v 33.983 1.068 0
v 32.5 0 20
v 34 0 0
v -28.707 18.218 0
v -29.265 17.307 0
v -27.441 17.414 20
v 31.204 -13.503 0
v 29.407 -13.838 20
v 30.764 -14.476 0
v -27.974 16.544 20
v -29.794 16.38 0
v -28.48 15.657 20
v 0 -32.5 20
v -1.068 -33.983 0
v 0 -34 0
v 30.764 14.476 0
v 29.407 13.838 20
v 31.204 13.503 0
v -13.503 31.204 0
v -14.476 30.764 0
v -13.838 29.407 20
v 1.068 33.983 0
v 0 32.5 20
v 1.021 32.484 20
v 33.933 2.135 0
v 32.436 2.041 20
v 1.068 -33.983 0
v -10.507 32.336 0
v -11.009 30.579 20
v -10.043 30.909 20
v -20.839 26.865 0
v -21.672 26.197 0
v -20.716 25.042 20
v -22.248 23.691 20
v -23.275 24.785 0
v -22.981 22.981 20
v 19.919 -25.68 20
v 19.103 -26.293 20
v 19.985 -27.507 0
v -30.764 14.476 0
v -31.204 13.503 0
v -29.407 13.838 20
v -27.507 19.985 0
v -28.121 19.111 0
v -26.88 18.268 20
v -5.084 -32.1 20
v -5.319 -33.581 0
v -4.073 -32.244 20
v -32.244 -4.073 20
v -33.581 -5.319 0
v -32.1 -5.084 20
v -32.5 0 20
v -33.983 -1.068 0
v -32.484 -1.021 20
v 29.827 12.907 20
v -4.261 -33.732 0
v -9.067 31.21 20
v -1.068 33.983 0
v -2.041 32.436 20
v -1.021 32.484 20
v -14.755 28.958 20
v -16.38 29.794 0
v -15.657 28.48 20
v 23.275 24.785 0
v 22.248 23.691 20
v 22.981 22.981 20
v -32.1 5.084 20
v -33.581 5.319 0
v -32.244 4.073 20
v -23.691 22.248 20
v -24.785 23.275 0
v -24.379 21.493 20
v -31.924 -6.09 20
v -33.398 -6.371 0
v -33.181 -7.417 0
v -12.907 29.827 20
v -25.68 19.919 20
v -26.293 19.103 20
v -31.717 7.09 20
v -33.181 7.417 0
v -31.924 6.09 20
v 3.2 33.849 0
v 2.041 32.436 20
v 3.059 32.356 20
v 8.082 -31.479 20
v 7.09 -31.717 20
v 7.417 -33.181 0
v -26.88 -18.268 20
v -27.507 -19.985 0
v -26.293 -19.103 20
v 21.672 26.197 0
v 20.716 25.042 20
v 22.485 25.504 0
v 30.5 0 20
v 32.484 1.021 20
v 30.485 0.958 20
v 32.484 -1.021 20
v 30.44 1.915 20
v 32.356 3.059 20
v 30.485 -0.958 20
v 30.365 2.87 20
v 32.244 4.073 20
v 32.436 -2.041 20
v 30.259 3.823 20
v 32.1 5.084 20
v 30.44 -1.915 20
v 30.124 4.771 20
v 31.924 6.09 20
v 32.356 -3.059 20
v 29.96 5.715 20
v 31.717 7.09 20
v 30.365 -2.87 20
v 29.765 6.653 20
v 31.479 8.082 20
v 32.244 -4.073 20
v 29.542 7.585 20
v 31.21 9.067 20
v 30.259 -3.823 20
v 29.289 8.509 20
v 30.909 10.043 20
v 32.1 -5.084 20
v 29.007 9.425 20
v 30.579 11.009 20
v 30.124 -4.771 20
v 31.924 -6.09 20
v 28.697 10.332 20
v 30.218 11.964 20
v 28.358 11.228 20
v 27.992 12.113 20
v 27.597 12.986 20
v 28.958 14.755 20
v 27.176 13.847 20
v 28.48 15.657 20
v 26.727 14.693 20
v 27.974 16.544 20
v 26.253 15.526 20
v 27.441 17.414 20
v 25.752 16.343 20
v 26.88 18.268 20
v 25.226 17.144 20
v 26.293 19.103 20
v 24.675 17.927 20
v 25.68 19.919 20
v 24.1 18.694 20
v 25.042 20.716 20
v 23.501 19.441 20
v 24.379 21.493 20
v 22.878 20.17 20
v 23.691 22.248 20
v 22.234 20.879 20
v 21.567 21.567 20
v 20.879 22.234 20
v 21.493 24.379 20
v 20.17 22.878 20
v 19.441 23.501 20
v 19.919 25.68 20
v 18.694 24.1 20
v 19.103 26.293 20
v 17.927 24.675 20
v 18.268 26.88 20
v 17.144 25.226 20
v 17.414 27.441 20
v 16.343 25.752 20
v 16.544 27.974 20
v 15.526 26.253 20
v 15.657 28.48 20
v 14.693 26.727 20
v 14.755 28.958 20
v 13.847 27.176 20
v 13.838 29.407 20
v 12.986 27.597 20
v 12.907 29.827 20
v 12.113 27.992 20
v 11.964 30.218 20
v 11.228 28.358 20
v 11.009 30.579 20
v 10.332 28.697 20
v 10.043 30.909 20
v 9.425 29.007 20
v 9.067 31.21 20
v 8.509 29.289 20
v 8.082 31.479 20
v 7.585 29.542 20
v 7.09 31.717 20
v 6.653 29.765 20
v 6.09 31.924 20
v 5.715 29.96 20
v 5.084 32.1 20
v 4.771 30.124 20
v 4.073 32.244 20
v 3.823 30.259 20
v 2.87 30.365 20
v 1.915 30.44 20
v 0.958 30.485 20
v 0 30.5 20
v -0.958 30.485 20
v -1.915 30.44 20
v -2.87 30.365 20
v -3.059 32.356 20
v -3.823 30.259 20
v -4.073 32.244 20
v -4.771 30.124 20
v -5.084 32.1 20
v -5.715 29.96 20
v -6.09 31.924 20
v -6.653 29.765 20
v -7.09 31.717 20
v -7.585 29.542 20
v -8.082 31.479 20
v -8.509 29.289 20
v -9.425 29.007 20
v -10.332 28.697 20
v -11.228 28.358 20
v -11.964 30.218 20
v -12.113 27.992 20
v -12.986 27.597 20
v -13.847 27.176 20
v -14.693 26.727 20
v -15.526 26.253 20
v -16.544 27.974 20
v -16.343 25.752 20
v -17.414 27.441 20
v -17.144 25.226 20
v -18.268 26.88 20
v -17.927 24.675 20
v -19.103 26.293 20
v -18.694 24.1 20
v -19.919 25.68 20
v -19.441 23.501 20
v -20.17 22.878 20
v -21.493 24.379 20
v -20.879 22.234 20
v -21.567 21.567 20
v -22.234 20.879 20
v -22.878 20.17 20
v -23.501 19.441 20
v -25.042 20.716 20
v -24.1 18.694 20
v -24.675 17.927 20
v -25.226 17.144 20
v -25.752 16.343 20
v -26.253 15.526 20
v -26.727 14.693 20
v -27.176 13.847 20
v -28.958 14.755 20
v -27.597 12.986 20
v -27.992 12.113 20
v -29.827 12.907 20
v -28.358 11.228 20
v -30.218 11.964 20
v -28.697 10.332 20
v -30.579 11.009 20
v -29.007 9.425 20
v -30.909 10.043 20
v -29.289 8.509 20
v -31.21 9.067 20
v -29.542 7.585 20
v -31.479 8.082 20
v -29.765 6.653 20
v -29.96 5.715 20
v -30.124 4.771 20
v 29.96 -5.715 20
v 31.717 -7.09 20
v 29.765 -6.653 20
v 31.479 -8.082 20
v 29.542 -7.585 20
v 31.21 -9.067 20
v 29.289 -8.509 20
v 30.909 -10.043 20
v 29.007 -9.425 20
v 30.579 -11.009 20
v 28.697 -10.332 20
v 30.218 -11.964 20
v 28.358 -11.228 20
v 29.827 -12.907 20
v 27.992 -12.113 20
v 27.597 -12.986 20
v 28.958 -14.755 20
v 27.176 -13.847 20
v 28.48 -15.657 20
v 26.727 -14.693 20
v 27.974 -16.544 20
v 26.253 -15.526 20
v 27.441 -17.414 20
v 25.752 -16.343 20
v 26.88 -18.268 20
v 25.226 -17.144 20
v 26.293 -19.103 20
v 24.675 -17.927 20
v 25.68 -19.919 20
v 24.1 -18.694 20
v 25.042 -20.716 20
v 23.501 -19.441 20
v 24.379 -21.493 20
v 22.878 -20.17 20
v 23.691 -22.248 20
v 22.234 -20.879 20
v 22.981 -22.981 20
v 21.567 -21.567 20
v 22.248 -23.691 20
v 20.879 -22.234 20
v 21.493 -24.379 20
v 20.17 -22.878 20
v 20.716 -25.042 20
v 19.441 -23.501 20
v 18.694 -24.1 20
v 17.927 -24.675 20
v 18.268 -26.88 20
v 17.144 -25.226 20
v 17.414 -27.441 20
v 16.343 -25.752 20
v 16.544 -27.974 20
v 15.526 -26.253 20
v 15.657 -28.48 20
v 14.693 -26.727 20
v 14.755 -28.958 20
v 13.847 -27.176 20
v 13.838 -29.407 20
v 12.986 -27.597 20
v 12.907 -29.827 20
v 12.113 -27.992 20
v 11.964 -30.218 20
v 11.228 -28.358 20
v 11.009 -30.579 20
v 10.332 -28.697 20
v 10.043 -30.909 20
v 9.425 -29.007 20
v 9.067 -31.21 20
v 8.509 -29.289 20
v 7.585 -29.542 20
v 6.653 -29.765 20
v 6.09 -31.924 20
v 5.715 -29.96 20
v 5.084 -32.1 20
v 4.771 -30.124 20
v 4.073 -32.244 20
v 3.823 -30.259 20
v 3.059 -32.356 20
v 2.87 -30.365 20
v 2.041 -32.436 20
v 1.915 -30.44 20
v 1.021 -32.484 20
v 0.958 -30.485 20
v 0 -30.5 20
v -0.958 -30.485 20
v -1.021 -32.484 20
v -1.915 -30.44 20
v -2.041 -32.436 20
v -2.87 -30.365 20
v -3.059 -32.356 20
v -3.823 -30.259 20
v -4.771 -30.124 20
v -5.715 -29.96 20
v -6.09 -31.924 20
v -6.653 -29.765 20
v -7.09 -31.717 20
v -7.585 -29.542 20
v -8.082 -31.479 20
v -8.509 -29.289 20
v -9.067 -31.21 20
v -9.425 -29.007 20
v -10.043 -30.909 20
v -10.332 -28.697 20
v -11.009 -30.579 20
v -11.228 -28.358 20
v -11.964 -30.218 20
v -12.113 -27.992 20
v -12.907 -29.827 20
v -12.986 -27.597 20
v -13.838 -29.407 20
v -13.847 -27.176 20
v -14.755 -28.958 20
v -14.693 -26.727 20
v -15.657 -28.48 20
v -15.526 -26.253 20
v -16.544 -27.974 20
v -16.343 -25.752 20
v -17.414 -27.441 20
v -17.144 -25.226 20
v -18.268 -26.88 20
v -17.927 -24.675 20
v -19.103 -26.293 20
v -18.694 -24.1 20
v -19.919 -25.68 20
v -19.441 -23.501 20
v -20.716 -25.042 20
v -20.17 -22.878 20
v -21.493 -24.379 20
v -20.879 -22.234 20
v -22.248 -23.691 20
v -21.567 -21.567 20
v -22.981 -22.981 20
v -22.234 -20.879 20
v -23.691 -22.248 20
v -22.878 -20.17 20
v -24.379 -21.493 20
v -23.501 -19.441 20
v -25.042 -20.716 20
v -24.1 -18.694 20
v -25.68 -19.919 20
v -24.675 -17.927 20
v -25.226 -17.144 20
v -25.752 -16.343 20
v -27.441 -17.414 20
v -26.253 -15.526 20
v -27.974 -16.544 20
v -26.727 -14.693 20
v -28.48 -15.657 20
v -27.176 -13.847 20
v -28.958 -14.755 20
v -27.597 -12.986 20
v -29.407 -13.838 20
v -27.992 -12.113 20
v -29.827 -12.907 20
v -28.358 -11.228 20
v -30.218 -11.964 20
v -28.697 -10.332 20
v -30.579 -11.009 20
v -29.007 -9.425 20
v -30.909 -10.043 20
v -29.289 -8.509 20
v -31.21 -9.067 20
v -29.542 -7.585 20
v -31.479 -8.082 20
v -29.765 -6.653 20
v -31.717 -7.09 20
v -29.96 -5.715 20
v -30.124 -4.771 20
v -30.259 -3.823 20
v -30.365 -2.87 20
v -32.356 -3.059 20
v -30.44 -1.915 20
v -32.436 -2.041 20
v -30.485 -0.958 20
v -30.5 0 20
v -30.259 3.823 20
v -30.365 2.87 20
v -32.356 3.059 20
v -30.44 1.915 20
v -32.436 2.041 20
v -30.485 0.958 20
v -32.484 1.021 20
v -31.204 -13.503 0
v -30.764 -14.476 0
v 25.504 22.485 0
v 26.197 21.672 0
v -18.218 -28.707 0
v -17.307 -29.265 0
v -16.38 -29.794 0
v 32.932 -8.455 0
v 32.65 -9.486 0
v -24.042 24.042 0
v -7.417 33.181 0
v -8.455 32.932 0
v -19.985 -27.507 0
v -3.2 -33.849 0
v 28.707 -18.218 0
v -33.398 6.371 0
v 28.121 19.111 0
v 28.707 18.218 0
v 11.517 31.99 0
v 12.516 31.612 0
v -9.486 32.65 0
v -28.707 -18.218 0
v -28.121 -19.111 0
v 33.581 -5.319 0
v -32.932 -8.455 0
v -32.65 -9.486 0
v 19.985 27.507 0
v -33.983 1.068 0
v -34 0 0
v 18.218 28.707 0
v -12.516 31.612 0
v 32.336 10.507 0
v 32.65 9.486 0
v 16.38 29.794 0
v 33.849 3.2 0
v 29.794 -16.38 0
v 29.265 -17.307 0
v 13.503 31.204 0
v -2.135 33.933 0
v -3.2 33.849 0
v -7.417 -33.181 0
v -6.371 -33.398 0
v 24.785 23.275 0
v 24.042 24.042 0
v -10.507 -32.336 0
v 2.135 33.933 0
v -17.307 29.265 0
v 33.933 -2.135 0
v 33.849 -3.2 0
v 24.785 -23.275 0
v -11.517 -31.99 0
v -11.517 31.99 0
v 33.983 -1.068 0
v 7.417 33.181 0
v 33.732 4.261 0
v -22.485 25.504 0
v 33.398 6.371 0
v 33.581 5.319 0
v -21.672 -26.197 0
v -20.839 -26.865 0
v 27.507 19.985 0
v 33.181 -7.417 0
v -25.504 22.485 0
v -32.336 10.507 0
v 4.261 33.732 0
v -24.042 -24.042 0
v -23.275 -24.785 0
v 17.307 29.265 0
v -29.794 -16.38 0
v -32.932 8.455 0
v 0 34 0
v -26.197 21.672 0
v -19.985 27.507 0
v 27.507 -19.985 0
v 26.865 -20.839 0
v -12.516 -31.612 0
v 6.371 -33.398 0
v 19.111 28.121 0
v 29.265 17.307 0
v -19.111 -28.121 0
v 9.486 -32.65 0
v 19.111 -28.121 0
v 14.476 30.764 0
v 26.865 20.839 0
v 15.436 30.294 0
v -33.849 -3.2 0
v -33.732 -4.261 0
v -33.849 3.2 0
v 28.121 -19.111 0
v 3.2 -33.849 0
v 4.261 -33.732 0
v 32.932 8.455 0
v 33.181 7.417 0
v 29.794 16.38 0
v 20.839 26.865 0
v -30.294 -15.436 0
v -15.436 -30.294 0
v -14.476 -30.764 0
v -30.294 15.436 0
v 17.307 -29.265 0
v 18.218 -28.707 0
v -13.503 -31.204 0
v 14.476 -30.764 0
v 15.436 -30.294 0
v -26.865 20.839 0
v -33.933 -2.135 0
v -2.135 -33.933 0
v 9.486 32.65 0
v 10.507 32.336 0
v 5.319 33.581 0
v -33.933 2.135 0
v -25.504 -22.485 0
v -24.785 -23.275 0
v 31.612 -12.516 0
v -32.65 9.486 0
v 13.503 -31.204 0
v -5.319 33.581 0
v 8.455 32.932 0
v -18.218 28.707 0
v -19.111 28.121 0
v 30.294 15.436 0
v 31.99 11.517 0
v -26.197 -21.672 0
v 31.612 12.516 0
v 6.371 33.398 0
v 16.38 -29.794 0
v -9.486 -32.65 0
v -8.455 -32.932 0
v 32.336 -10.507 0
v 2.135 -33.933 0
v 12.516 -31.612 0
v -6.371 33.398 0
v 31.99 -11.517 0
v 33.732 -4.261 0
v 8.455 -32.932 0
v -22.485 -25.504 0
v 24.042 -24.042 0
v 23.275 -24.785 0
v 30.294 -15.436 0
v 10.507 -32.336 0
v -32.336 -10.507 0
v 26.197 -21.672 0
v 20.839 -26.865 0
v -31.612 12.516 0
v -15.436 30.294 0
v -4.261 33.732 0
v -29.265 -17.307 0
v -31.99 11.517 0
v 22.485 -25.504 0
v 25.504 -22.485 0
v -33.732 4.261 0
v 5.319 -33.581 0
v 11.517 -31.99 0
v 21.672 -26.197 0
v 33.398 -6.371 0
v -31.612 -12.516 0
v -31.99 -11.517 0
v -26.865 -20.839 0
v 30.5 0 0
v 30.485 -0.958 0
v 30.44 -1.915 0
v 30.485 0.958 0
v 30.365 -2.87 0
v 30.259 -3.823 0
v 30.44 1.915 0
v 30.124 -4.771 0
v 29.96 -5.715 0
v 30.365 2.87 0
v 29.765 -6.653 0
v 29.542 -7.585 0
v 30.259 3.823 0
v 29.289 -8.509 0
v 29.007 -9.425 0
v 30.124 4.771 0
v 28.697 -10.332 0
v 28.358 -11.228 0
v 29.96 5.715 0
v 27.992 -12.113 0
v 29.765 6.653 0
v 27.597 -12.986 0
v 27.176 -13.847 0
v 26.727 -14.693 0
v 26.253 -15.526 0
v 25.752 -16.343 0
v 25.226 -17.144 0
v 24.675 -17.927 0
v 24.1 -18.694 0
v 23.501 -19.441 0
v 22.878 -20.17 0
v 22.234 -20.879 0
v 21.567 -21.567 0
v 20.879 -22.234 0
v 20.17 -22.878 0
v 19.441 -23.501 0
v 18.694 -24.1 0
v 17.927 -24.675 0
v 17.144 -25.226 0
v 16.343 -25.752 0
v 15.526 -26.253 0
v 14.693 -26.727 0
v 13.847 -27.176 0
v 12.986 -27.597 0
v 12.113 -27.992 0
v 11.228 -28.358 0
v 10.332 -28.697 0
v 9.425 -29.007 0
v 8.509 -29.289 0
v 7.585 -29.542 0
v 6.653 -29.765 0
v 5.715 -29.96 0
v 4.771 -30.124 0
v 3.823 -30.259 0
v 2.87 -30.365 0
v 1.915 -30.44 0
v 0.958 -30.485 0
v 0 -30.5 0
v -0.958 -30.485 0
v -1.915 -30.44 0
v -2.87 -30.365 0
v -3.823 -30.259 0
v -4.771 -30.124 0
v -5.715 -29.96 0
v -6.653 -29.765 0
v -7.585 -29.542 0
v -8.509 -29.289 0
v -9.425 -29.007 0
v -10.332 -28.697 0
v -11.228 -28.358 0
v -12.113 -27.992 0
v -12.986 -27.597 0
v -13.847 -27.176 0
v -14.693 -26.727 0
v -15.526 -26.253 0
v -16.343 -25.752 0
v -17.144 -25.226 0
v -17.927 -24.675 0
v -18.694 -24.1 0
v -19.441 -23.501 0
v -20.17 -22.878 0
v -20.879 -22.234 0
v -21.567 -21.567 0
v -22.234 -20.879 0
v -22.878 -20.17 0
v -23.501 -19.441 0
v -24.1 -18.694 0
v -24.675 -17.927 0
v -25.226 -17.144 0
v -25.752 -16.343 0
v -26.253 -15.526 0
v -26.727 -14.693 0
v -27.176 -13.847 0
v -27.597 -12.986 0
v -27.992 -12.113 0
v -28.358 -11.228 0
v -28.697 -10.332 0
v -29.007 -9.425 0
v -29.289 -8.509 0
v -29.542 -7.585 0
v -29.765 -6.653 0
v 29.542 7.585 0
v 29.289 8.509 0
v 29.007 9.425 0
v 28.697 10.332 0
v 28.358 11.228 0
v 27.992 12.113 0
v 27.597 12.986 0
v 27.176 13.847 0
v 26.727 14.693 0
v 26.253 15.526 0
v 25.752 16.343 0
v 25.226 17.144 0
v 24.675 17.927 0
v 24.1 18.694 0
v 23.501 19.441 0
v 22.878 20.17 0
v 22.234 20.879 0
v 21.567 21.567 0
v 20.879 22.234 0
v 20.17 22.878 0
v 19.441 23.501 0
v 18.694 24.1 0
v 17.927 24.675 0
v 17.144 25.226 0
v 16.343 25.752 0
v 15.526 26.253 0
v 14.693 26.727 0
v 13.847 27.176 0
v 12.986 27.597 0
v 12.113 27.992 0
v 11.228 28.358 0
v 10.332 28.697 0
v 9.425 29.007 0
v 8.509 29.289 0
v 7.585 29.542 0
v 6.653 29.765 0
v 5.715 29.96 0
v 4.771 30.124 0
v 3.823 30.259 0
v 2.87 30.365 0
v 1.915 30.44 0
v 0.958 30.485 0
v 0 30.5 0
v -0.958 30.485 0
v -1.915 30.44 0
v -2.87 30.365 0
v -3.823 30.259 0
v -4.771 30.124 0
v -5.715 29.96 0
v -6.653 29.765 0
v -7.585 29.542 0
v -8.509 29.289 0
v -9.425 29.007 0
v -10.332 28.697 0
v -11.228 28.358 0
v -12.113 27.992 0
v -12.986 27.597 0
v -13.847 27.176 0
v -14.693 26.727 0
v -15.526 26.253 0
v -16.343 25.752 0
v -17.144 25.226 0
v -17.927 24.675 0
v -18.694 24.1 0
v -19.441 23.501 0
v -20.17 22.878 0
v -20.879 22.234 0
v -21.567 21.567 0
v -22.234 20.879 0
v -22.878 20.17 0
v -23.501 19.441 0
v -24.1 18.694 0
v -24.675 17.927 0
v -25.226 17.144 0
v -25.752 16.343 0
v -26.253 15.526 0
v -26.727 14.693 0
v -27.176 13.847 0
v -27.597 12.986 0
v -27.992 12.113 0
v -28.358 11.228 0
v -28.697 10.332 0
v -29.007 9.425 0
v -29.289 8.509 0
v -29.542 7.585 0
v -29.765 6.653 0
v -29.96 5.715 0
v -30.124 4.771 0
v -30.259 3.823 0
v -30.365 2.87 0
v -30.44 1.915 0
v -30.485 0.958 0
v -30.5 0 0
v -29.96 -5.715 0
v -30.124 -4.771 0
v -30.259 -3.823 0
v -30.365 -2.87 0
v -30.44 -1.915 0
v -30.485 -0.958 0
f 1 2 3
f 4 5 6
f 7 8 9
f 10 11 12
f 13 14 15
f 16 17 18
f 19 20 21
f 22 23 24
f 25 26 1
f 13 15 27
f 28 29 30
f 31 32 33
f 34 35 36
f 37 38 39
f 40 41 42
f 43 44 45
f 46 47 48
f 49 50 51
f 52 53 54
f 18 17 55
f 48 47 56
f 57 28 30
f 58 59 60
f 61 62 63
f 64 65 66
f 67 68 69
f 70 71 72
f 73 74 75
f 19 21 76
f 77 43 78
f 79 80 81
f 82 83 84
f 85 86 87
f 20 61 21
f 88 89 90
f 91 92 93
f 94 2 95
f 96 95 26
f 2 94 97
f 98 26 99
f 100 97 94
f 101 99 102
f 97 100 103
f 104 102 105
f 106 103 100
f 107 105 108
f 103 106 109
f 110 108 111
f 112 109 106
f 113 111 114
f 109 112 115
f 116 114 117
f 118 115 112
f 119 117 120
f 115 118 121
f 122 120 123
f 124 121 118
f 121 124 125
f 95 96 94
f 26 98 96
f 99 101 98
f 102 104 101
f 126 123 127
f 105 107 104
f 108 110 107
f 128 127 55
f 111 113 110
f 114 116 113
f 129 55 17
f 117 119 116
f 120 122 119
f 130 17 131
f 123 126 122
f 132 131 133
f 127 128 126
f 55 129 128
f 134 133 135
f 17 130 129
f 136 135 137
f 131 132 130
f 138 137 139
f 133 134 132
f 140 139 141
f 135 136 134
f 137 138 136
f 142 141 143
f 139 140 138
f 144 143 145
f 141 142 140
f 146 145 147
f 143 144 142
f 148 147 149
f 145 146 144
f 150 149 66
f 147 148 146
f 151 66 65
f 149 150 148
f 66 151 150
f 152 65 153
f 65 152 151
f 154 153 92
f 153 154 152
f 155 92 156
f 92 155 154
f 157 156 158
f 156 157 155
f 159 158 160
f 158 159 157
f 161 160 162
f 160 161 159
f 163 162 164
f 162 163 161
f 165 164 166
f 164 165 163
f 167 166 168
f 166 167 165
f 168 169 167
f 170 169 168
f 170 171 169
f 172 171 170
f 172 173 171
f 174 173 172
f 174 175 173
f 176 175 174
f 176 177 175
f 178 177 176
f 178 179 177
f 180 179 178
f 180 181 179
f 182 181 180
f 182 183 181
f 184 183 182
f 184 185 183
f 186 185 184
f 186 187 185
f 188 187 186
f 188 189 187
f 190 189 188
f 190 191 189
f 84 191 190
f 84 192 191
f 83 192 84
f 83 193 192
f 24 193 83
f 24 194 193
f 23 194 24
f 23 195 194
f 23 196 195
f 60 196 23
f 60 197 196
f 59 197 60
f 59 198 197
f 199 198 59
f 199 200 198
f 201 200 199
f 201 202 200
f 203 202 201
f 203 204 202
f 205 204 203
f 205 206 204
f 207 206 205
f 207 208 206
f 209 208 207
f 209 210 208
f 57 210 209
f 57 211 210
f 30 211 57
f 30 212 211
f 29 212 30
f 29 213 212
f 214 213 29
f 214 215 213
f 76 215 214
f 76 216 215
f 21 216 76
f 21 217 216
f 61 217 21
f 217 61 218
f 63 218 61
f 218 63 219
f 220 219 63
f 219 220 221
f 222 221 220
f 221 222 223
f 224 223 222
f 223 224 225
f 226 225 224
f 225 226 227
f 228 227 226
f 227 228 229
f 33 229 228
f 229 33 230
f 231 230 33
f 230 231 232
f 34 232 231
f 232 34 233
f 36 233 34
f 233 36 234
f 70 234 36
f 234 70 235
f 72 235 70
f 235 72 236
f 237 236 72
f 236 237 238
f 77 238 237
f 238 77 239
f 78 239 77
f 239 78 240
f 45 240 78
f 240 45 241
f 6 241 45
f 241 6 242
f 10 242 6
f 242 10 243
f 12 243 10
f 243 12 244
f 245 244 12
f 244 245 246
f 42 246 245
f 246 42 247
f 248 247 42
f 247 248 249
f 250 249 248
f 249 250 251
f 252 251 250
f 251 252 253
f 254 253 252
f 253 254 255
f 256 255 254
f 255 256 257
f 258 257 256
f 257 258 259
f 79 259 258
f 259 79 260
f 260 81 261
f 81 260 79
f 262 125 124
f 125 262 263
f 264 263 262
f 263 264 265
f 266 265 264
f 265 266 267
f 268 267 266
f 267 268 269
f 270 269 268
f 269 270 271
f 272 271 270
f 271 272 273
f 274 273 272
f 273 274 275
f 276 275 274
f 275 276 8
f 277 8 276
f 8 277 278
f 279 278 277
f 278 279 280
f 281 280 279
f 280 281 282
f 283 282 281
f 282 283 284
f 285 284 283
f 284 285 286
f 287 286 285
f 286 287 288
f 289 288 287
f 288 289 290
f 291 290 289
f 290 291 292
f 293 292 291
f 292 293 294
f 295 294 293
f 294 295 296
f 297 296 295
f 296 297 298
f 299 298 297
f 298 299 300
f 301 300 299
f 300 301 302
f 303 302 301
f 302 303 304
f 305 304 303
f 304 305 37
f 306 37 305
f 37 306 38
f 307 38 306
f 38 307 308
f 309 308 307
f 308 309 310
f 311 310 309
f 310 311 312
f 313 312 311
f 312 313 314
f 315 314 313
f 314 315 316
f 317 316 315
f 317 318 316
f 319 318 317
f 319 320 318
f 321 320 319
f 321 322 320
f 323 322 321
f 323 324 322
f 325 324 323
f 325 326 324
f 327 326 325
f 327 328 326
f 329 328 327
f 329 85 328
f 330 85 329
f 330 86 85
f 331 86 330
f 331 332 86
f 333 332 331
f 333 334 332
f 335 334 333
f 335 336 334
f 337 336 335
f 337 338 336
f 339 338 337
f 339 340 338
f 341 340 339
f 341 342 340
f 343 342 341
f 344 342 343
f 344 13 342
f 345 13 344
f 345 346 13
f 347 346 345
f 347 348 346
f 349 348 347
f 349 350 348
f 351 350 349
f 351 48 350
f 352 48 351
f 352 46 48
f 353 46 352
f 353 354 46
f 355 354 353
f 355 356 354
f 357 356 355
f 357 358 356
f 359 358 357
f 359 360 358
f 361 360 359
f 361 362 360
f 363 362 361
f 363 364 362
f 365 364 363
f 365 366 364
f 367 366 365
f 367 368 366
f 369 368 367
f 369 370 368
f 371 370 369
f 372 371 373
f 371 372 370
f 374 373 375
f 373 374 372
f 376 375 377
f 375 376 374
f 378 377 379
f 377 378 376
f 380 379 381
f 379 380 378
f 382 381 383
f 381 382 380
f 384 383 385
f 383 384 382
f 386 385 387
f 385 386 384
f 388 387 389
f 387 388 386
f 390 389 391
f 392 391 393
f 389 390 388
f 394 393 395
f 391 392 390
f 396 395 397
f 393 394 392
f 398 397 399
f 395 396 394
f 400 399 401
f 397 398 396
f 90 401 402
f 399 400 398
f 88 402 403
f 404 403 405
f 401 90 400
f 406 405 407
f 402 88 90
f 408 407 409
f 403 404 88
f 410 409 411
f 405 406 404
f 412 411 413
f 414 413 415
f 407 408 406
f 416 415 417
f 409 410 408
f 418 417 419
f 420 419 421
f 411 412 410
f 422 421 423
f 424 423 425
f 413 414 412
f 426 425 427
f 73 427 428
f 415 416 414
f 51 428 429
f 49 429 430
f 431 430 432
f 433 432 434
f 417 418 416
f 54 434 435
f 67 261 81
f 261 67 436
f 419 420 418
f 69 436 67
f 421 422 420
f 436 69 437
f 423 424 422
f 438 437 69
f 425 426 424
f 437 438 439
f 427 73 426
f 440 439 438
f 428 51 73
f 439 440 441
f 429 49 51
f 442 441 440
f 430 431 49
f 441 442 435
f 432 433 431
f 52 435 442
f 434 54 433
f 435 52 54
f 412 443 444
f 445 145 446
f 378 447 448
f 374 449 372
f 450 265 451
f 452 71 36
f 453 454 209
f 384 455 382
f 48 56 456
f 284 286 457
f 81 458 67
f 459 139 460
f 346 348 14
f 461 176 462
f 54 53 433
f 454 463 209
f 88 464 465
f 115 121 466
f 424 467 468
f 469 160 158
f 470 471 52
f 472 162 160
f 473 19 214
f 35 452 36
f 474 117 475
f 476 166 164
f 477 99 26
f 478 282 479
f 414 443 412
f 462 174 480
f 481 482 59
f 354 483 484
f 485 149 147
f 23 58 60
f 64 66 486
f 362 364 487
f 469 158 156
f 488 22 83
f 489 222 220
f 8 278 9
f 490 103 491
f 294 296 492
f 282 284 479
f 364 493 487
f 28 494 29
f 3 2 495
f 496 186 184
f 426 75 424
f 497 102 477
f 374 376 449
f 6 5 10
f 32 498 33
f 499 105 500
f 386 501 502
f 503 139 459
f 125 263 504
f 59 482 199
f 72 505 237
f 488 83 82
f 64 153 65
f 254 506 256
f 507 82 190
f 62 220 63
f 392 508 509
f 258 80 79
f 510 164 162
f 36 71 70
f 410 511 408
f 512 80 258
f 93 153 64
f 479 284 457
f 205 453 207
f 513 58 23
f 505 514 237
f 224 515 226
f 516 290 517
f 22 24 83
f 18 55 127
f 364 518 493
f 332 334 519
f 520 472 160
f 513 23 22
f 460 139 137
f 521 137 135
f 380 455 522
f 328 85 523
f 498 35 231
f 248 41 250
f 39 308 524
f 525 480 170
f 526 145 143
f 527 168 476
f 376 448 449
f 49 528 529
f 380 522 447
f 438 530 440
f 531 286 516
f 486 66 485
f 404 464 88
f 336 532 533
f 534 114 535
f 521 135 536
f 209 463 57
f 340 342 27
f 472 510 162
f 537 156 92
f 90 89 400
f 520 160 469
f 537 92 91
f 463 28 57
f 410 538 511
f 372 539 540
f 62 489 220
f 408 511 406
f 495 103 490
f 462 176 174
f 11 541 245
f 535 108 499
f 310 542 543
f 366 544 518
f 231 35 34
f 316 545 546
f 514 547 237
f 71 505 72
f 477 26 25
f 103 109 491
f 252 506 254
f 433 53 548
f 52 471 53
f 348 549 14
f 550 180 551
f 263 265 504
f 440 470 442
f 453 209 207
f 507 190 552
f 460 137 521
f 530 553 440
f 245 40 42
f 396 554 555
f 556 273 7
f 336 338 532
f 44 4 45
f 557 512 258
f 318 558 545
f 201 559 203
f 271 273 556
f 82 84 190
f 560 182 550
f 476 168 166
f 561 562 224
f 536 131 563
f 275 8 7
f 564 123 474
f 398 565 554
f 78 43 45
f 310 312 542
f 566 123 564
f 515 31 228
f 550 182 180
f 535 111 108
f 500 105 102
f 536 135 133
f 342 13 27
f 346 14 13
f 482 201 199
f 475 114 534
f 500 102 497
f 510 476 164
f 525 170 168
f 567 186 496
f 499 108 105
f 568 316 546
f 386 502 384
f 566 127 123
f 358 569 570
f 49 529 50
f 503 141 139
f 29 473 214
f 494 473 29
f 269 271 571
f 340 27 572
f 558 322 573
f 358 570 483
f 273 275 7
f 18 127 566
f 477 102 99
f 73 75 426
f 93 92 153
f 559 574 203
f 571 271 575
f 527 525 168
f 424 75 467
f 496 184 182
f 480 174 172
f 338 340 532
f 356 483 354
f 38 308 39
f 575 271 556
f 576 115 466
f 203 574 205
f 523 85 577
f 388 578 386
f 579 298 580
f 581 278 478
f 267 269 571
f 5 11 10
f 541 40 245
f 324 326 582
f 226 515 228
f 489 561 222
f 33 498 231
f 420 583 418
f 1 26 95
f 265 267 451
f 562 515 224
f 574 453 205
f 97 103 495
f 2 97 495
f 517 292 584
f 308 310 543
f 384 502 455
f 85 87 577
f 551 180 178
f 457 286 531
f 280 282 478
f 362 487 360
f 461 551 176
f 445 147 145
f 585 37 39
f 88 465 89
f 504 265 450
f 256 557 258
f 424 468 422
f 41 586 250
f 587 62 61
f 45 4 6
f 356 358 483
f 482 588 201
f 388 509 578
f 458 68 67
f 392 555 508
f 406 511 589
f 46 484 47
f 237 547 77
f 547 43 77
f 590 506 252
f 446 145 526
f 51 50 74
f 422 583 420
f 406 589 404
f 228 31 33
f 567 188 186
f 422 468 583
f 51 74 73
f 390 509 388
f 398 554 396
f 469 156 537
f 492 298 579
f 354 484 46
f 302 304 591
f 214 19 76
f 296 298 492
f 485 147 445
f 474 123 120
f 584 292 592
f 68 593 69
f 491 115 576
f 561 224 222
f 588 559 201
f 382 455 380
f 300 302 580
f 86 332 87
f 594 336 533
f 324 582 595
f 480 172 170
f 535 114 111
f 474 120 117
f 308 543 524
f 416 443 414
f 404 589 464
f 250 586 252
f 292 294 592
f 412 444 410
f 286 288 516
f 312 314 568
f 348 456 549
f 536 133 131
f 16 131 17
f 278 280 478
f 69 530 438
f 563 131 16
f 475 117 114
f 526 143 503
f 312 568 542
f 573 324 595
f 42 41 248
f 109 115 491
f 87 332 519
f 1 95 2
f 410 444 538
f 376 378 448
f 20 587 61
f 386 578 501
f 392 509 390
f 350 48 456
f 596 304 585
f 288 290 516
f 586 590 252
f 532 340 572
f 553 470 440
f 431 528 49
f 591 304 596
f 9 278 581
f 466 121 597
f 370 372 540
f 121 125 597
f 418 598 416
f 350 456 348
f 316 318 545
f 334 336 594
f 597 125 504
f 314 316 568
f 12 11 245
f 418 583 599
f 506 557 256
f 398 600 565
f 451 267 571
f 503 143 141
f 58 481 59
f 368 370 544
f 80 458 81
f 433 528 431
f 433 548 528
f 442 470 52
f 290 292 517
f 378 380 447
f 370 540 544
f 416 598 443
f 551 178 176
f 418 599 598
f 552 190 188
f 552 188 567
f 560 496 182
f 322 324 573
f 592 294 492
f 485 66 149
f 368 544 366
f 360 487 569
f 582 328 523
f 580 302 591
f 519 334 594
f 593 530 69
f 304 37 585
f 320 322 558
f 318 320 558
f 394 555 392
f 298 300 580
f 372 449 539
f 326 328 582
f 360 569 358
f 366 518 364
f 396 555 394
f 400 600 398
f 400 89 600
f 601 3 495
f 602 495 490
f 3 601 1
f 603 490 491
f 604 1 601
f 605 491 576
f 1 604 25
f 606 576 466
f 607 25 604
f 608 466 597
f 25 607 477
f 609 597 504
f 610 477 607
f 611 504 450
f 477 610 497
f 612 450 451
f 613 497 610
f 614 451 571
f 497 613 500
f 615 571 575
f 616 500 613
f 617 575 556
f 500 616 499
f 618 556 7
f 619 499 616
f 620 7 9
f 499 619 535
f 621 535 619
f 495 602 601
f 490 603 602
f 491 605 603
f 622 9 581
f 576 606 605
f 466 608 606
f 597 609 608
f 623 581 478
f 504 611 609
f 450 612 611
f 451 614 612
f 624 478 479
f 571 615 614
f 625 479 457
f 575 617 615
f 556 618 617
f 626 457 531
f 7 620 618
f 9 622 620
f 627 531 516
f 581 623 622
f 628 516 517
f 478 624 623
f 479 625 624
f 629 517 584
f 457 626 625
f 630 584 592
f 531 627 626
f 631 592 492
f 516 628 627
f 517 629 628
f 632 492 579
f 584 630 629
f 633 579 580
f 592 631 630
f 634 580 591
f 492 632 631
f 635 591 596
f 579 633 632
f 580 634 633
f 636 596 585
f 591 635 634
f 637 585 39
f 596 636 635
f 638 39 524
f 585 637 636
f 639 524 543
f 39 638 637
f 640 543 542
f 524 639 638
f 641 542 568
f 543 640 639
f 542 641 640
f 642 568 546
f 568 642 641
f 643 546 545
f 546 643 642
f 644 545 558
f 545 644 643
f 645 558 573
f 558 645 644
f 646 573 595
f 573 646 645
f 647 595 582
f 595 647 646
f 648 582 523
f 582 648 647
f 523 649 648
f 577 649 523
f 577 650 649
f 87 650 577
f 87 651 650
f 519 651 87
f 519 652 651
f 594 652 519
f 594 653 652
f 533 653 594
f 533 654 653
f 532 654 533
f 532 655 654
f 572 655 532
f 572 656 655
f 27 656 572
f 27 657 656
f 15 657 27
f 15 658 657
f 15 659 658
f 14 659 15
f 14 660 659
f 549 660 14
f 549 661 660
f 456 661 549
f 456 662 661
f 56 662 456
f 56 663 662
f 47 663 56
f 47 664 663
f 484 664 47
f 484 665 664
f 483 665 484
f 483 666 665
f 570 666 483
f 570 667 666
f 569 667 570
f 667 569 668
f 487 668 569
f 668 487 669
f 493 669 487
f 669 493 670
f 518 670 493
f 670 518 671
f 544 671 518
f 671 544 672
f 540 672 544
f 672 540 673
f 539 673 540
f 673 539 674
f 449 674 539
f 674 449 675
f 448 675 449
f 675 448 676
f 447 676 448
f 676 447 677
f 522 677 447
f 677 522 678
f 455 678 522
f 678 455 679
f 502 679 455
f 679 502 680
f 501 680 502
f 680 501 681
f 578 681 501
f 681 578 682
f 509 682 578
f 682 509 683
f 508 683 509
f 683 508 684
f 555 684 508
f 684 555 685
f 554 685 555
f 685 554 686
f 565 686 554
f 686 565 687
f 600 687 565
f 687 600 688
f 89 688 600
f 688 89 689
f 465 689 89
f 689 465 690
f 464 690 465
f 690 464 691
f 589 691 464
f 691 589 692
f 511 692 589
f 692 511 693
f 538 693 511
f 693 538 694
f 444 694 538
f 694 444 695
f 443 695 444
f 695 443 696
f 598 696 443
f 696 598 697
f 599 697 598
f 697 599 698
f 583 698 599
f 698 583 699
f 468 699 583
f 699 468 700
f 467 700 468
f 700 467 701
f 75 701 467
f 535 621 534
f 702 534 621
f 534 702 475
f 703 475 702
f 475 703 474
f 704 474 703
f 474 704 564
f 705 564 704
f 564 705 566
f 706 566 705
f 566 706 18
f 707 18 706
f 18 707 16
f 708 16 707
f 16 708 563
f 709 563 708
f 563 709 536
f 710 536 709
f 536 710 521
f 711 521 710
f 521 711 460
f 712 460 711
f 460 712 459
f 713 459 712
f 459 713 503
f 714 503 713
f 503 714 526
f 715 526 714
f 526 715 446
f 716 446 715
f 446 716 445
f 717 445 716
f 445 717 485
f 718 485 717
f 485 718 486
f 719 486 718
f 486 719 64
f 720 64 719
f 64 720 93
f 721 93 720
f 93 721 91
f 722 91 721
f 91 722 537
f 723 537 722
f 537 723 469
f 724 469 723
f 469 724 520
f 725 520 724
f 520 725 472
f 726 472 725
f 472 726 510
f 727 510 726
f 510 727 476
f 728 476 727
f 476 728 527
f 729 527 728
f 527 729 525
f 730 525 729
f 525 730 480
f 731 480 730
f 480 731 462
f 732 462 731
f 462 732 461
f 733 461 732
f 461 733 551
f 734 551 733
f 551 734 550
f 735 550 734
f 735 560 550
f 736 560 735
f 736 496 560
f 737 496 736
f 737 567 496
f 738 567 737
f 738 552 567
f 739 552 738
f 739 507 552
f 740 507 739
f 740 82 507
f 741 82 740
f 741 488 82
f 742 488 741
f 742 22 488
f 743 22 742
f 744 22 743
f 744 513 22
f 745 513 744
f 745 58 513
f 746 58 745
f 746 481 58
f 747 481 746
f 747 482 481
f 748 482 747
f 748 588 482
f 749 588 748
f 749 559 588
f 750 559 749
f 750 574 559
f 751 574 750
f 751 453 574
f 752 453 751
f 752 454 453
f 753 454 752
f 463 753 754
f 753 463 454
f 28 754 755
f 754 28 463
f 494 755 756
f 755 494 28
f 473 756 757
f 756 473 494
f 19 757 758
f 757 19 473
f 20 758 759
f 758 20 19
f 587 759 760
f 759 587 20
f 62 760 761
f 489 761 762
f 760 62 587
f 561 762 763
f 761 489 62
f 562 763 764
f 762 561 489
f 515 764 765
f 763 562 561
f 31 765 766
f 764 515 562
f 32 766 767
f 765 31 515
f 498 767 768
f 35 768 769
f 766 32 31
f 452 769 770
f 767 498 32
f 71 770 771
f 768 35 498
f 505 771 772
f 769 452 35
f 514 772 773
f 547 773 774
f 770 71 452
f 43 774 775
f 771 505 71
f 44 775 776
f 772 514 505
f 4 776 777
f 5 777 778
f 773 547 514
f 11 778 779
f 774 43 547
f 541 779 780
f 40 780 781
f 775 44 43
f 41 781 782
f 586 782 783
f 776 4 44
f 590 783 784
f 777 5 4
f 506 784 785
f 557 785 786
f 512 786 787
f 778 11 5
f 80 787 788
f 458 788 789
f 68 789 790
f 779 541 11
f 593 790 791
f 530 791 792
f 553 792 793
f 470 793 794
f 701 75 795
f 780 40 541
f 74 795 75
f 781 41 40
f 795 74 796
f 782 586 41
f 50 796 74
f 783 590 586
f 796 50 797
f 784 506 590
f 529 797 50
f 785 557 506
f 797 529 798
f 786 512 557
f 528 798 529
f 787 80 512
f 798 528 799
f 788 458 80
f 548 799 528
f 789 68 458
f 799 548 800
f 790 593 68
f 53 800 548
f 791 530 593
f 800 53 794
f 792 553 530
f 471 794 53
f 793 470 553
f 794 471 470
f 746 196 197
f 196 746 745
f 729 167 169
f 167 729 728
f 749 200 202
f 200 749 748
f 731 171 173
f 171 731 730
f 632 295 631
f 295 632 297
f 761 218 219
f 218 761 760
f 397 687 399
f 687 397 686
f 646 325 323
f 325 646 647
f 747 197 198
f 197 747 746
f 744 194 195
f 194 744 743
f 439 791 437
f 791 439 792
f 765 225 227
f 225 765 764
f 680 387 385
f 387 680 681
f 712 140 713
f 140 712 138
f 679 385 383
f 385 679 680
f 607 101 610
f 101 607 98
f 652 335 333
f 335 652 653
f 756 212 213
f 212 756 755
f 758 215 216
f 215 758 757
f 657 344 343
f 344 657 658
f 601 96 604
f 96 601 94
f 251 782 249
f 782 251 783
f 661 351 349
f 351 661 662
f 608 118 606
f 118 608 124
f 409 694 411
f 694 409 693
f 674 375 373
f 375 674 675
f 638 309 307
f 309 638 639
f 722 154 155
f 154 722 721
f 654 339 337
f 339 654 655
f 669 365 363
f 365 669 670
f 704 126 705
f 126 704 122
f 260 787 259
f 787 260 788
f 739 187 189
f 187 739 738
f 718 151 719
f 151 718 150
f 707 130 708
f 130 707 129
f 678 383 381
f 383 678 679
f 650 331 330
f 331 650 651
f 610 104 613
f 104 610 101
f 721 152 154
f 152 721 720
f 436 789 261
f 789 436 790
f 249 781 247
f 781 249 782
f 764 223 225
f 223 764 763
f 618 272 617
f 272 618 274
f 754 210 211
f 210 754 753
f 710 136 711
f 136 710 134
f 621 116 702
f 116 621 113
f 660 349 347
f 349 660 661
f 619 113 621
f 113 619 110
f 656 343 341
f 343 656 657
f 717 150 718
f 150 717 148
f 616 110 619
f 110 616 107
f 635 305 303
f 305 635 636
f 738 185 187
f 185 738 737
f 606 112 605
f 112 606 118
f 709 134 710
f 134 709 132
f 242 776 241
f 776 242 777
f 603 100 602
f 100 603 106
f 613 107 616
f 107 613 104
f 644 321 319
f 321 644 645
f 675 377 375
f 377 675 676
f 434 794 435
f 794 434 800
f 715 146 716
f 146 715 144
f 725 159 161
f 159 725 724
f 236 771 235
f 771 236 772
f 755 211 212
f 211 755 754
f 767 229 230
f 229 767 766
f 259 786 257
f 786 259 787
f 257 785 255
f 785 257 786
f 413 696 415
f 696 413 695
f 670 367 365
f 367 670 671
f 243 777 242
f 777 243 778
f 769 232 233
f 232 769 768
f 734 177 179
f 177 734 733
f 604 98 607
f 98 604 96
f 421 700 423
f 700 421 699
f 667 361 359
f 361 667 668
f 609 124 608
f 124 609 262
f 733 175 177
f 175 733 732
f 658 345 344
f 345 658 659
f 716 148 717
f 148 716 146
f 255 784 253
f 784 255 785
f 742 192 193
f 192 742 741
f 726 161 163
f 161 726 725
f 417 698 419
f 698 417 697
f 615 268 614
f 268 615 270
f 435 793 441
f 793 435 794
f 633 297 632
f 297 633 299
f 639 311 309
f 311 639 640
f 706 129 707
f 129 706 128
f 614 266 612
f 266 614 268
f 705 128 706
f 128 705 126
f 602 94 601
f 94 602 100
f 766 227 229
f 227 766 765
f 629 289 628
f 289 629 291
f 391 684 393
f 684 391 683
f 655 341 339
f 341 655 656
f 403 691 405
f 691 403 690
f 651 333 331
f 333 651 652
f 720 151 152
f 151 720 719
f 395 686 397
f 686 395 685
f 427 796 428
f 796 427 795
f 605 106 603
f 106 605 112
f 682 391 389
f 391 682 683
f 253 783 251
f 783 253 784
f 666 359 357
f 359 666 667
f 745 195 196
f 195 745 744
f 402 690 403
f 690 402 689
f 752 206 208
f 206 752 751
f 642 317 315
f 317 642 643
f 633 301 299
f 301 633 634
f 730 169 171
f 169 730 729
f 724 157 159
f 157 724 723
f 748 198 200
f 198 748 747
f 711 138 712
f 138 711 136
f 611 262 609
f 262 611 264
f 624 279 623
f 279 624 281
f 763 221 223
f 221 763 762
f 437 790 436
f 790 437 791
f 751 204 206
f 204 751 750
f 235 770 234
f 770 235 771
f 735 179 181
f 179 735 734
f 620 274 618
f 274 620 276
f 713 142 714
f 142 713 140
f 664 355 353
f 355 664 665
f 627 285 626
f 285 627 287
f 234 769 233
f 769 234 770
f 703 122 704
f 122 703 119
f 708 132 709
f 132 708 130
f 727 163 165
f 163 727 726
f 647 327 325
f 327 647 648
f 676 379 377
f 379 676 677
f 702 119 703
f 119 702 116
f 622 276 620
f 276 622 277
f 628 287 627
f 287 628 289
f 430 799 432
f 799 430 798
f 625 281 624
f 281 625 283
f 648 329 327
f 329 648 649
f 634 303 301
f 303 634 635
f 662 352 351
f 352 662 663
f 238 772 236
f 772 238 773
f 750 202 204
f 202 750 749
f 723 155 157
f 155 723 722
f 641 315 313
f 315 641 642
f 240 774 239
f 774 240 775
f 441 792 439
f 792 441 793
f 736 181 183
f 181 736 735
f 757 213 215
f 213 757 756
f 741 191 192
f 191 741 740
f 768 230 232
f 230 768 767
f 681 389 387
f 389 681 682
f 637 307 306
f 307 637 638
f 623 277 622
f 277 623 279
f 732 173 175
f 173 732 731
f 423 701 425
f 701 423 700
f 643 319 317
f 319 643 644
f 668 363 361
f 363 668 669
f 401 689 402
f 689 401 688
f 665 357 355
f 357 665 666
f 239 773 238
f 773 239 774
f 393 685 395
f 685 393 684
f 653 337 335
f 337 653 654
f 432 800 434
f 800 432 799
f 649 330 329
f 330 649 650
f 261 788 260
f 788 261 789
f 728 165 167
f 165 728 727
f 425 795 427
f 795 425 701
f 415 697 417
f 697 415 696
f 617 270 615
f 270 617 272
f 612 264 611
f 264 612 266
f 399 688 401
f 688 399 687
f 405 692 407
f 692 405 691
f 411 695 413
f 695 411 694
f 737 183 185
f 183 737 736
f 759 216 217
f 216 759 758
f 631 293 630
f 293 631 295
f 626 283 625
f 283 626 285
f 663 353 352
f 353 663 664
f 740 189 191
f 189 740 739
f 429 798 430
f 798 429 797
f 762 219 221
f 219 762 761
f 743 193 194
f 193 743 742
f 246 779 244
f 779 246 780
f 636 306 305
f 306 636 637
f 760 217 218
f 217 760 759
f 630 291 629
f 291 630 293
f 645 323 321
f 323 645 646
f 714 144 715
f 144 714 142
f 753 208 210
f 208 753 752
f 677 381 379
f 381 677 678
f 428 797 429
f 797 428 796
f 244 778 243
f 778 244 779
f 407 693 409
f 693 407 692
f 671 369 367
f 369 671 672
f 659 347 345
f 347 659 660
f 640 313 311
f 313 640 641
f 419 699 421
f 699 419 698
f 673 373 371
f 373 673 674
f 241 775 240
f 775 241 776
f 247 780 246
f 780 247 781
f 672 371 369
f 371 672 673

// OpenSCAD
outerDiammeter=68;
innerDiammeter=61;
conicVariation=3;
height=20;
difference ()
  {

		cylinder (d1=outerDiammeter,d2=outerDiammeter-conicVariation, h=height, $fn=200);
		cylinder (d=innerDiammeter, h=25, $fn=200);

  }
